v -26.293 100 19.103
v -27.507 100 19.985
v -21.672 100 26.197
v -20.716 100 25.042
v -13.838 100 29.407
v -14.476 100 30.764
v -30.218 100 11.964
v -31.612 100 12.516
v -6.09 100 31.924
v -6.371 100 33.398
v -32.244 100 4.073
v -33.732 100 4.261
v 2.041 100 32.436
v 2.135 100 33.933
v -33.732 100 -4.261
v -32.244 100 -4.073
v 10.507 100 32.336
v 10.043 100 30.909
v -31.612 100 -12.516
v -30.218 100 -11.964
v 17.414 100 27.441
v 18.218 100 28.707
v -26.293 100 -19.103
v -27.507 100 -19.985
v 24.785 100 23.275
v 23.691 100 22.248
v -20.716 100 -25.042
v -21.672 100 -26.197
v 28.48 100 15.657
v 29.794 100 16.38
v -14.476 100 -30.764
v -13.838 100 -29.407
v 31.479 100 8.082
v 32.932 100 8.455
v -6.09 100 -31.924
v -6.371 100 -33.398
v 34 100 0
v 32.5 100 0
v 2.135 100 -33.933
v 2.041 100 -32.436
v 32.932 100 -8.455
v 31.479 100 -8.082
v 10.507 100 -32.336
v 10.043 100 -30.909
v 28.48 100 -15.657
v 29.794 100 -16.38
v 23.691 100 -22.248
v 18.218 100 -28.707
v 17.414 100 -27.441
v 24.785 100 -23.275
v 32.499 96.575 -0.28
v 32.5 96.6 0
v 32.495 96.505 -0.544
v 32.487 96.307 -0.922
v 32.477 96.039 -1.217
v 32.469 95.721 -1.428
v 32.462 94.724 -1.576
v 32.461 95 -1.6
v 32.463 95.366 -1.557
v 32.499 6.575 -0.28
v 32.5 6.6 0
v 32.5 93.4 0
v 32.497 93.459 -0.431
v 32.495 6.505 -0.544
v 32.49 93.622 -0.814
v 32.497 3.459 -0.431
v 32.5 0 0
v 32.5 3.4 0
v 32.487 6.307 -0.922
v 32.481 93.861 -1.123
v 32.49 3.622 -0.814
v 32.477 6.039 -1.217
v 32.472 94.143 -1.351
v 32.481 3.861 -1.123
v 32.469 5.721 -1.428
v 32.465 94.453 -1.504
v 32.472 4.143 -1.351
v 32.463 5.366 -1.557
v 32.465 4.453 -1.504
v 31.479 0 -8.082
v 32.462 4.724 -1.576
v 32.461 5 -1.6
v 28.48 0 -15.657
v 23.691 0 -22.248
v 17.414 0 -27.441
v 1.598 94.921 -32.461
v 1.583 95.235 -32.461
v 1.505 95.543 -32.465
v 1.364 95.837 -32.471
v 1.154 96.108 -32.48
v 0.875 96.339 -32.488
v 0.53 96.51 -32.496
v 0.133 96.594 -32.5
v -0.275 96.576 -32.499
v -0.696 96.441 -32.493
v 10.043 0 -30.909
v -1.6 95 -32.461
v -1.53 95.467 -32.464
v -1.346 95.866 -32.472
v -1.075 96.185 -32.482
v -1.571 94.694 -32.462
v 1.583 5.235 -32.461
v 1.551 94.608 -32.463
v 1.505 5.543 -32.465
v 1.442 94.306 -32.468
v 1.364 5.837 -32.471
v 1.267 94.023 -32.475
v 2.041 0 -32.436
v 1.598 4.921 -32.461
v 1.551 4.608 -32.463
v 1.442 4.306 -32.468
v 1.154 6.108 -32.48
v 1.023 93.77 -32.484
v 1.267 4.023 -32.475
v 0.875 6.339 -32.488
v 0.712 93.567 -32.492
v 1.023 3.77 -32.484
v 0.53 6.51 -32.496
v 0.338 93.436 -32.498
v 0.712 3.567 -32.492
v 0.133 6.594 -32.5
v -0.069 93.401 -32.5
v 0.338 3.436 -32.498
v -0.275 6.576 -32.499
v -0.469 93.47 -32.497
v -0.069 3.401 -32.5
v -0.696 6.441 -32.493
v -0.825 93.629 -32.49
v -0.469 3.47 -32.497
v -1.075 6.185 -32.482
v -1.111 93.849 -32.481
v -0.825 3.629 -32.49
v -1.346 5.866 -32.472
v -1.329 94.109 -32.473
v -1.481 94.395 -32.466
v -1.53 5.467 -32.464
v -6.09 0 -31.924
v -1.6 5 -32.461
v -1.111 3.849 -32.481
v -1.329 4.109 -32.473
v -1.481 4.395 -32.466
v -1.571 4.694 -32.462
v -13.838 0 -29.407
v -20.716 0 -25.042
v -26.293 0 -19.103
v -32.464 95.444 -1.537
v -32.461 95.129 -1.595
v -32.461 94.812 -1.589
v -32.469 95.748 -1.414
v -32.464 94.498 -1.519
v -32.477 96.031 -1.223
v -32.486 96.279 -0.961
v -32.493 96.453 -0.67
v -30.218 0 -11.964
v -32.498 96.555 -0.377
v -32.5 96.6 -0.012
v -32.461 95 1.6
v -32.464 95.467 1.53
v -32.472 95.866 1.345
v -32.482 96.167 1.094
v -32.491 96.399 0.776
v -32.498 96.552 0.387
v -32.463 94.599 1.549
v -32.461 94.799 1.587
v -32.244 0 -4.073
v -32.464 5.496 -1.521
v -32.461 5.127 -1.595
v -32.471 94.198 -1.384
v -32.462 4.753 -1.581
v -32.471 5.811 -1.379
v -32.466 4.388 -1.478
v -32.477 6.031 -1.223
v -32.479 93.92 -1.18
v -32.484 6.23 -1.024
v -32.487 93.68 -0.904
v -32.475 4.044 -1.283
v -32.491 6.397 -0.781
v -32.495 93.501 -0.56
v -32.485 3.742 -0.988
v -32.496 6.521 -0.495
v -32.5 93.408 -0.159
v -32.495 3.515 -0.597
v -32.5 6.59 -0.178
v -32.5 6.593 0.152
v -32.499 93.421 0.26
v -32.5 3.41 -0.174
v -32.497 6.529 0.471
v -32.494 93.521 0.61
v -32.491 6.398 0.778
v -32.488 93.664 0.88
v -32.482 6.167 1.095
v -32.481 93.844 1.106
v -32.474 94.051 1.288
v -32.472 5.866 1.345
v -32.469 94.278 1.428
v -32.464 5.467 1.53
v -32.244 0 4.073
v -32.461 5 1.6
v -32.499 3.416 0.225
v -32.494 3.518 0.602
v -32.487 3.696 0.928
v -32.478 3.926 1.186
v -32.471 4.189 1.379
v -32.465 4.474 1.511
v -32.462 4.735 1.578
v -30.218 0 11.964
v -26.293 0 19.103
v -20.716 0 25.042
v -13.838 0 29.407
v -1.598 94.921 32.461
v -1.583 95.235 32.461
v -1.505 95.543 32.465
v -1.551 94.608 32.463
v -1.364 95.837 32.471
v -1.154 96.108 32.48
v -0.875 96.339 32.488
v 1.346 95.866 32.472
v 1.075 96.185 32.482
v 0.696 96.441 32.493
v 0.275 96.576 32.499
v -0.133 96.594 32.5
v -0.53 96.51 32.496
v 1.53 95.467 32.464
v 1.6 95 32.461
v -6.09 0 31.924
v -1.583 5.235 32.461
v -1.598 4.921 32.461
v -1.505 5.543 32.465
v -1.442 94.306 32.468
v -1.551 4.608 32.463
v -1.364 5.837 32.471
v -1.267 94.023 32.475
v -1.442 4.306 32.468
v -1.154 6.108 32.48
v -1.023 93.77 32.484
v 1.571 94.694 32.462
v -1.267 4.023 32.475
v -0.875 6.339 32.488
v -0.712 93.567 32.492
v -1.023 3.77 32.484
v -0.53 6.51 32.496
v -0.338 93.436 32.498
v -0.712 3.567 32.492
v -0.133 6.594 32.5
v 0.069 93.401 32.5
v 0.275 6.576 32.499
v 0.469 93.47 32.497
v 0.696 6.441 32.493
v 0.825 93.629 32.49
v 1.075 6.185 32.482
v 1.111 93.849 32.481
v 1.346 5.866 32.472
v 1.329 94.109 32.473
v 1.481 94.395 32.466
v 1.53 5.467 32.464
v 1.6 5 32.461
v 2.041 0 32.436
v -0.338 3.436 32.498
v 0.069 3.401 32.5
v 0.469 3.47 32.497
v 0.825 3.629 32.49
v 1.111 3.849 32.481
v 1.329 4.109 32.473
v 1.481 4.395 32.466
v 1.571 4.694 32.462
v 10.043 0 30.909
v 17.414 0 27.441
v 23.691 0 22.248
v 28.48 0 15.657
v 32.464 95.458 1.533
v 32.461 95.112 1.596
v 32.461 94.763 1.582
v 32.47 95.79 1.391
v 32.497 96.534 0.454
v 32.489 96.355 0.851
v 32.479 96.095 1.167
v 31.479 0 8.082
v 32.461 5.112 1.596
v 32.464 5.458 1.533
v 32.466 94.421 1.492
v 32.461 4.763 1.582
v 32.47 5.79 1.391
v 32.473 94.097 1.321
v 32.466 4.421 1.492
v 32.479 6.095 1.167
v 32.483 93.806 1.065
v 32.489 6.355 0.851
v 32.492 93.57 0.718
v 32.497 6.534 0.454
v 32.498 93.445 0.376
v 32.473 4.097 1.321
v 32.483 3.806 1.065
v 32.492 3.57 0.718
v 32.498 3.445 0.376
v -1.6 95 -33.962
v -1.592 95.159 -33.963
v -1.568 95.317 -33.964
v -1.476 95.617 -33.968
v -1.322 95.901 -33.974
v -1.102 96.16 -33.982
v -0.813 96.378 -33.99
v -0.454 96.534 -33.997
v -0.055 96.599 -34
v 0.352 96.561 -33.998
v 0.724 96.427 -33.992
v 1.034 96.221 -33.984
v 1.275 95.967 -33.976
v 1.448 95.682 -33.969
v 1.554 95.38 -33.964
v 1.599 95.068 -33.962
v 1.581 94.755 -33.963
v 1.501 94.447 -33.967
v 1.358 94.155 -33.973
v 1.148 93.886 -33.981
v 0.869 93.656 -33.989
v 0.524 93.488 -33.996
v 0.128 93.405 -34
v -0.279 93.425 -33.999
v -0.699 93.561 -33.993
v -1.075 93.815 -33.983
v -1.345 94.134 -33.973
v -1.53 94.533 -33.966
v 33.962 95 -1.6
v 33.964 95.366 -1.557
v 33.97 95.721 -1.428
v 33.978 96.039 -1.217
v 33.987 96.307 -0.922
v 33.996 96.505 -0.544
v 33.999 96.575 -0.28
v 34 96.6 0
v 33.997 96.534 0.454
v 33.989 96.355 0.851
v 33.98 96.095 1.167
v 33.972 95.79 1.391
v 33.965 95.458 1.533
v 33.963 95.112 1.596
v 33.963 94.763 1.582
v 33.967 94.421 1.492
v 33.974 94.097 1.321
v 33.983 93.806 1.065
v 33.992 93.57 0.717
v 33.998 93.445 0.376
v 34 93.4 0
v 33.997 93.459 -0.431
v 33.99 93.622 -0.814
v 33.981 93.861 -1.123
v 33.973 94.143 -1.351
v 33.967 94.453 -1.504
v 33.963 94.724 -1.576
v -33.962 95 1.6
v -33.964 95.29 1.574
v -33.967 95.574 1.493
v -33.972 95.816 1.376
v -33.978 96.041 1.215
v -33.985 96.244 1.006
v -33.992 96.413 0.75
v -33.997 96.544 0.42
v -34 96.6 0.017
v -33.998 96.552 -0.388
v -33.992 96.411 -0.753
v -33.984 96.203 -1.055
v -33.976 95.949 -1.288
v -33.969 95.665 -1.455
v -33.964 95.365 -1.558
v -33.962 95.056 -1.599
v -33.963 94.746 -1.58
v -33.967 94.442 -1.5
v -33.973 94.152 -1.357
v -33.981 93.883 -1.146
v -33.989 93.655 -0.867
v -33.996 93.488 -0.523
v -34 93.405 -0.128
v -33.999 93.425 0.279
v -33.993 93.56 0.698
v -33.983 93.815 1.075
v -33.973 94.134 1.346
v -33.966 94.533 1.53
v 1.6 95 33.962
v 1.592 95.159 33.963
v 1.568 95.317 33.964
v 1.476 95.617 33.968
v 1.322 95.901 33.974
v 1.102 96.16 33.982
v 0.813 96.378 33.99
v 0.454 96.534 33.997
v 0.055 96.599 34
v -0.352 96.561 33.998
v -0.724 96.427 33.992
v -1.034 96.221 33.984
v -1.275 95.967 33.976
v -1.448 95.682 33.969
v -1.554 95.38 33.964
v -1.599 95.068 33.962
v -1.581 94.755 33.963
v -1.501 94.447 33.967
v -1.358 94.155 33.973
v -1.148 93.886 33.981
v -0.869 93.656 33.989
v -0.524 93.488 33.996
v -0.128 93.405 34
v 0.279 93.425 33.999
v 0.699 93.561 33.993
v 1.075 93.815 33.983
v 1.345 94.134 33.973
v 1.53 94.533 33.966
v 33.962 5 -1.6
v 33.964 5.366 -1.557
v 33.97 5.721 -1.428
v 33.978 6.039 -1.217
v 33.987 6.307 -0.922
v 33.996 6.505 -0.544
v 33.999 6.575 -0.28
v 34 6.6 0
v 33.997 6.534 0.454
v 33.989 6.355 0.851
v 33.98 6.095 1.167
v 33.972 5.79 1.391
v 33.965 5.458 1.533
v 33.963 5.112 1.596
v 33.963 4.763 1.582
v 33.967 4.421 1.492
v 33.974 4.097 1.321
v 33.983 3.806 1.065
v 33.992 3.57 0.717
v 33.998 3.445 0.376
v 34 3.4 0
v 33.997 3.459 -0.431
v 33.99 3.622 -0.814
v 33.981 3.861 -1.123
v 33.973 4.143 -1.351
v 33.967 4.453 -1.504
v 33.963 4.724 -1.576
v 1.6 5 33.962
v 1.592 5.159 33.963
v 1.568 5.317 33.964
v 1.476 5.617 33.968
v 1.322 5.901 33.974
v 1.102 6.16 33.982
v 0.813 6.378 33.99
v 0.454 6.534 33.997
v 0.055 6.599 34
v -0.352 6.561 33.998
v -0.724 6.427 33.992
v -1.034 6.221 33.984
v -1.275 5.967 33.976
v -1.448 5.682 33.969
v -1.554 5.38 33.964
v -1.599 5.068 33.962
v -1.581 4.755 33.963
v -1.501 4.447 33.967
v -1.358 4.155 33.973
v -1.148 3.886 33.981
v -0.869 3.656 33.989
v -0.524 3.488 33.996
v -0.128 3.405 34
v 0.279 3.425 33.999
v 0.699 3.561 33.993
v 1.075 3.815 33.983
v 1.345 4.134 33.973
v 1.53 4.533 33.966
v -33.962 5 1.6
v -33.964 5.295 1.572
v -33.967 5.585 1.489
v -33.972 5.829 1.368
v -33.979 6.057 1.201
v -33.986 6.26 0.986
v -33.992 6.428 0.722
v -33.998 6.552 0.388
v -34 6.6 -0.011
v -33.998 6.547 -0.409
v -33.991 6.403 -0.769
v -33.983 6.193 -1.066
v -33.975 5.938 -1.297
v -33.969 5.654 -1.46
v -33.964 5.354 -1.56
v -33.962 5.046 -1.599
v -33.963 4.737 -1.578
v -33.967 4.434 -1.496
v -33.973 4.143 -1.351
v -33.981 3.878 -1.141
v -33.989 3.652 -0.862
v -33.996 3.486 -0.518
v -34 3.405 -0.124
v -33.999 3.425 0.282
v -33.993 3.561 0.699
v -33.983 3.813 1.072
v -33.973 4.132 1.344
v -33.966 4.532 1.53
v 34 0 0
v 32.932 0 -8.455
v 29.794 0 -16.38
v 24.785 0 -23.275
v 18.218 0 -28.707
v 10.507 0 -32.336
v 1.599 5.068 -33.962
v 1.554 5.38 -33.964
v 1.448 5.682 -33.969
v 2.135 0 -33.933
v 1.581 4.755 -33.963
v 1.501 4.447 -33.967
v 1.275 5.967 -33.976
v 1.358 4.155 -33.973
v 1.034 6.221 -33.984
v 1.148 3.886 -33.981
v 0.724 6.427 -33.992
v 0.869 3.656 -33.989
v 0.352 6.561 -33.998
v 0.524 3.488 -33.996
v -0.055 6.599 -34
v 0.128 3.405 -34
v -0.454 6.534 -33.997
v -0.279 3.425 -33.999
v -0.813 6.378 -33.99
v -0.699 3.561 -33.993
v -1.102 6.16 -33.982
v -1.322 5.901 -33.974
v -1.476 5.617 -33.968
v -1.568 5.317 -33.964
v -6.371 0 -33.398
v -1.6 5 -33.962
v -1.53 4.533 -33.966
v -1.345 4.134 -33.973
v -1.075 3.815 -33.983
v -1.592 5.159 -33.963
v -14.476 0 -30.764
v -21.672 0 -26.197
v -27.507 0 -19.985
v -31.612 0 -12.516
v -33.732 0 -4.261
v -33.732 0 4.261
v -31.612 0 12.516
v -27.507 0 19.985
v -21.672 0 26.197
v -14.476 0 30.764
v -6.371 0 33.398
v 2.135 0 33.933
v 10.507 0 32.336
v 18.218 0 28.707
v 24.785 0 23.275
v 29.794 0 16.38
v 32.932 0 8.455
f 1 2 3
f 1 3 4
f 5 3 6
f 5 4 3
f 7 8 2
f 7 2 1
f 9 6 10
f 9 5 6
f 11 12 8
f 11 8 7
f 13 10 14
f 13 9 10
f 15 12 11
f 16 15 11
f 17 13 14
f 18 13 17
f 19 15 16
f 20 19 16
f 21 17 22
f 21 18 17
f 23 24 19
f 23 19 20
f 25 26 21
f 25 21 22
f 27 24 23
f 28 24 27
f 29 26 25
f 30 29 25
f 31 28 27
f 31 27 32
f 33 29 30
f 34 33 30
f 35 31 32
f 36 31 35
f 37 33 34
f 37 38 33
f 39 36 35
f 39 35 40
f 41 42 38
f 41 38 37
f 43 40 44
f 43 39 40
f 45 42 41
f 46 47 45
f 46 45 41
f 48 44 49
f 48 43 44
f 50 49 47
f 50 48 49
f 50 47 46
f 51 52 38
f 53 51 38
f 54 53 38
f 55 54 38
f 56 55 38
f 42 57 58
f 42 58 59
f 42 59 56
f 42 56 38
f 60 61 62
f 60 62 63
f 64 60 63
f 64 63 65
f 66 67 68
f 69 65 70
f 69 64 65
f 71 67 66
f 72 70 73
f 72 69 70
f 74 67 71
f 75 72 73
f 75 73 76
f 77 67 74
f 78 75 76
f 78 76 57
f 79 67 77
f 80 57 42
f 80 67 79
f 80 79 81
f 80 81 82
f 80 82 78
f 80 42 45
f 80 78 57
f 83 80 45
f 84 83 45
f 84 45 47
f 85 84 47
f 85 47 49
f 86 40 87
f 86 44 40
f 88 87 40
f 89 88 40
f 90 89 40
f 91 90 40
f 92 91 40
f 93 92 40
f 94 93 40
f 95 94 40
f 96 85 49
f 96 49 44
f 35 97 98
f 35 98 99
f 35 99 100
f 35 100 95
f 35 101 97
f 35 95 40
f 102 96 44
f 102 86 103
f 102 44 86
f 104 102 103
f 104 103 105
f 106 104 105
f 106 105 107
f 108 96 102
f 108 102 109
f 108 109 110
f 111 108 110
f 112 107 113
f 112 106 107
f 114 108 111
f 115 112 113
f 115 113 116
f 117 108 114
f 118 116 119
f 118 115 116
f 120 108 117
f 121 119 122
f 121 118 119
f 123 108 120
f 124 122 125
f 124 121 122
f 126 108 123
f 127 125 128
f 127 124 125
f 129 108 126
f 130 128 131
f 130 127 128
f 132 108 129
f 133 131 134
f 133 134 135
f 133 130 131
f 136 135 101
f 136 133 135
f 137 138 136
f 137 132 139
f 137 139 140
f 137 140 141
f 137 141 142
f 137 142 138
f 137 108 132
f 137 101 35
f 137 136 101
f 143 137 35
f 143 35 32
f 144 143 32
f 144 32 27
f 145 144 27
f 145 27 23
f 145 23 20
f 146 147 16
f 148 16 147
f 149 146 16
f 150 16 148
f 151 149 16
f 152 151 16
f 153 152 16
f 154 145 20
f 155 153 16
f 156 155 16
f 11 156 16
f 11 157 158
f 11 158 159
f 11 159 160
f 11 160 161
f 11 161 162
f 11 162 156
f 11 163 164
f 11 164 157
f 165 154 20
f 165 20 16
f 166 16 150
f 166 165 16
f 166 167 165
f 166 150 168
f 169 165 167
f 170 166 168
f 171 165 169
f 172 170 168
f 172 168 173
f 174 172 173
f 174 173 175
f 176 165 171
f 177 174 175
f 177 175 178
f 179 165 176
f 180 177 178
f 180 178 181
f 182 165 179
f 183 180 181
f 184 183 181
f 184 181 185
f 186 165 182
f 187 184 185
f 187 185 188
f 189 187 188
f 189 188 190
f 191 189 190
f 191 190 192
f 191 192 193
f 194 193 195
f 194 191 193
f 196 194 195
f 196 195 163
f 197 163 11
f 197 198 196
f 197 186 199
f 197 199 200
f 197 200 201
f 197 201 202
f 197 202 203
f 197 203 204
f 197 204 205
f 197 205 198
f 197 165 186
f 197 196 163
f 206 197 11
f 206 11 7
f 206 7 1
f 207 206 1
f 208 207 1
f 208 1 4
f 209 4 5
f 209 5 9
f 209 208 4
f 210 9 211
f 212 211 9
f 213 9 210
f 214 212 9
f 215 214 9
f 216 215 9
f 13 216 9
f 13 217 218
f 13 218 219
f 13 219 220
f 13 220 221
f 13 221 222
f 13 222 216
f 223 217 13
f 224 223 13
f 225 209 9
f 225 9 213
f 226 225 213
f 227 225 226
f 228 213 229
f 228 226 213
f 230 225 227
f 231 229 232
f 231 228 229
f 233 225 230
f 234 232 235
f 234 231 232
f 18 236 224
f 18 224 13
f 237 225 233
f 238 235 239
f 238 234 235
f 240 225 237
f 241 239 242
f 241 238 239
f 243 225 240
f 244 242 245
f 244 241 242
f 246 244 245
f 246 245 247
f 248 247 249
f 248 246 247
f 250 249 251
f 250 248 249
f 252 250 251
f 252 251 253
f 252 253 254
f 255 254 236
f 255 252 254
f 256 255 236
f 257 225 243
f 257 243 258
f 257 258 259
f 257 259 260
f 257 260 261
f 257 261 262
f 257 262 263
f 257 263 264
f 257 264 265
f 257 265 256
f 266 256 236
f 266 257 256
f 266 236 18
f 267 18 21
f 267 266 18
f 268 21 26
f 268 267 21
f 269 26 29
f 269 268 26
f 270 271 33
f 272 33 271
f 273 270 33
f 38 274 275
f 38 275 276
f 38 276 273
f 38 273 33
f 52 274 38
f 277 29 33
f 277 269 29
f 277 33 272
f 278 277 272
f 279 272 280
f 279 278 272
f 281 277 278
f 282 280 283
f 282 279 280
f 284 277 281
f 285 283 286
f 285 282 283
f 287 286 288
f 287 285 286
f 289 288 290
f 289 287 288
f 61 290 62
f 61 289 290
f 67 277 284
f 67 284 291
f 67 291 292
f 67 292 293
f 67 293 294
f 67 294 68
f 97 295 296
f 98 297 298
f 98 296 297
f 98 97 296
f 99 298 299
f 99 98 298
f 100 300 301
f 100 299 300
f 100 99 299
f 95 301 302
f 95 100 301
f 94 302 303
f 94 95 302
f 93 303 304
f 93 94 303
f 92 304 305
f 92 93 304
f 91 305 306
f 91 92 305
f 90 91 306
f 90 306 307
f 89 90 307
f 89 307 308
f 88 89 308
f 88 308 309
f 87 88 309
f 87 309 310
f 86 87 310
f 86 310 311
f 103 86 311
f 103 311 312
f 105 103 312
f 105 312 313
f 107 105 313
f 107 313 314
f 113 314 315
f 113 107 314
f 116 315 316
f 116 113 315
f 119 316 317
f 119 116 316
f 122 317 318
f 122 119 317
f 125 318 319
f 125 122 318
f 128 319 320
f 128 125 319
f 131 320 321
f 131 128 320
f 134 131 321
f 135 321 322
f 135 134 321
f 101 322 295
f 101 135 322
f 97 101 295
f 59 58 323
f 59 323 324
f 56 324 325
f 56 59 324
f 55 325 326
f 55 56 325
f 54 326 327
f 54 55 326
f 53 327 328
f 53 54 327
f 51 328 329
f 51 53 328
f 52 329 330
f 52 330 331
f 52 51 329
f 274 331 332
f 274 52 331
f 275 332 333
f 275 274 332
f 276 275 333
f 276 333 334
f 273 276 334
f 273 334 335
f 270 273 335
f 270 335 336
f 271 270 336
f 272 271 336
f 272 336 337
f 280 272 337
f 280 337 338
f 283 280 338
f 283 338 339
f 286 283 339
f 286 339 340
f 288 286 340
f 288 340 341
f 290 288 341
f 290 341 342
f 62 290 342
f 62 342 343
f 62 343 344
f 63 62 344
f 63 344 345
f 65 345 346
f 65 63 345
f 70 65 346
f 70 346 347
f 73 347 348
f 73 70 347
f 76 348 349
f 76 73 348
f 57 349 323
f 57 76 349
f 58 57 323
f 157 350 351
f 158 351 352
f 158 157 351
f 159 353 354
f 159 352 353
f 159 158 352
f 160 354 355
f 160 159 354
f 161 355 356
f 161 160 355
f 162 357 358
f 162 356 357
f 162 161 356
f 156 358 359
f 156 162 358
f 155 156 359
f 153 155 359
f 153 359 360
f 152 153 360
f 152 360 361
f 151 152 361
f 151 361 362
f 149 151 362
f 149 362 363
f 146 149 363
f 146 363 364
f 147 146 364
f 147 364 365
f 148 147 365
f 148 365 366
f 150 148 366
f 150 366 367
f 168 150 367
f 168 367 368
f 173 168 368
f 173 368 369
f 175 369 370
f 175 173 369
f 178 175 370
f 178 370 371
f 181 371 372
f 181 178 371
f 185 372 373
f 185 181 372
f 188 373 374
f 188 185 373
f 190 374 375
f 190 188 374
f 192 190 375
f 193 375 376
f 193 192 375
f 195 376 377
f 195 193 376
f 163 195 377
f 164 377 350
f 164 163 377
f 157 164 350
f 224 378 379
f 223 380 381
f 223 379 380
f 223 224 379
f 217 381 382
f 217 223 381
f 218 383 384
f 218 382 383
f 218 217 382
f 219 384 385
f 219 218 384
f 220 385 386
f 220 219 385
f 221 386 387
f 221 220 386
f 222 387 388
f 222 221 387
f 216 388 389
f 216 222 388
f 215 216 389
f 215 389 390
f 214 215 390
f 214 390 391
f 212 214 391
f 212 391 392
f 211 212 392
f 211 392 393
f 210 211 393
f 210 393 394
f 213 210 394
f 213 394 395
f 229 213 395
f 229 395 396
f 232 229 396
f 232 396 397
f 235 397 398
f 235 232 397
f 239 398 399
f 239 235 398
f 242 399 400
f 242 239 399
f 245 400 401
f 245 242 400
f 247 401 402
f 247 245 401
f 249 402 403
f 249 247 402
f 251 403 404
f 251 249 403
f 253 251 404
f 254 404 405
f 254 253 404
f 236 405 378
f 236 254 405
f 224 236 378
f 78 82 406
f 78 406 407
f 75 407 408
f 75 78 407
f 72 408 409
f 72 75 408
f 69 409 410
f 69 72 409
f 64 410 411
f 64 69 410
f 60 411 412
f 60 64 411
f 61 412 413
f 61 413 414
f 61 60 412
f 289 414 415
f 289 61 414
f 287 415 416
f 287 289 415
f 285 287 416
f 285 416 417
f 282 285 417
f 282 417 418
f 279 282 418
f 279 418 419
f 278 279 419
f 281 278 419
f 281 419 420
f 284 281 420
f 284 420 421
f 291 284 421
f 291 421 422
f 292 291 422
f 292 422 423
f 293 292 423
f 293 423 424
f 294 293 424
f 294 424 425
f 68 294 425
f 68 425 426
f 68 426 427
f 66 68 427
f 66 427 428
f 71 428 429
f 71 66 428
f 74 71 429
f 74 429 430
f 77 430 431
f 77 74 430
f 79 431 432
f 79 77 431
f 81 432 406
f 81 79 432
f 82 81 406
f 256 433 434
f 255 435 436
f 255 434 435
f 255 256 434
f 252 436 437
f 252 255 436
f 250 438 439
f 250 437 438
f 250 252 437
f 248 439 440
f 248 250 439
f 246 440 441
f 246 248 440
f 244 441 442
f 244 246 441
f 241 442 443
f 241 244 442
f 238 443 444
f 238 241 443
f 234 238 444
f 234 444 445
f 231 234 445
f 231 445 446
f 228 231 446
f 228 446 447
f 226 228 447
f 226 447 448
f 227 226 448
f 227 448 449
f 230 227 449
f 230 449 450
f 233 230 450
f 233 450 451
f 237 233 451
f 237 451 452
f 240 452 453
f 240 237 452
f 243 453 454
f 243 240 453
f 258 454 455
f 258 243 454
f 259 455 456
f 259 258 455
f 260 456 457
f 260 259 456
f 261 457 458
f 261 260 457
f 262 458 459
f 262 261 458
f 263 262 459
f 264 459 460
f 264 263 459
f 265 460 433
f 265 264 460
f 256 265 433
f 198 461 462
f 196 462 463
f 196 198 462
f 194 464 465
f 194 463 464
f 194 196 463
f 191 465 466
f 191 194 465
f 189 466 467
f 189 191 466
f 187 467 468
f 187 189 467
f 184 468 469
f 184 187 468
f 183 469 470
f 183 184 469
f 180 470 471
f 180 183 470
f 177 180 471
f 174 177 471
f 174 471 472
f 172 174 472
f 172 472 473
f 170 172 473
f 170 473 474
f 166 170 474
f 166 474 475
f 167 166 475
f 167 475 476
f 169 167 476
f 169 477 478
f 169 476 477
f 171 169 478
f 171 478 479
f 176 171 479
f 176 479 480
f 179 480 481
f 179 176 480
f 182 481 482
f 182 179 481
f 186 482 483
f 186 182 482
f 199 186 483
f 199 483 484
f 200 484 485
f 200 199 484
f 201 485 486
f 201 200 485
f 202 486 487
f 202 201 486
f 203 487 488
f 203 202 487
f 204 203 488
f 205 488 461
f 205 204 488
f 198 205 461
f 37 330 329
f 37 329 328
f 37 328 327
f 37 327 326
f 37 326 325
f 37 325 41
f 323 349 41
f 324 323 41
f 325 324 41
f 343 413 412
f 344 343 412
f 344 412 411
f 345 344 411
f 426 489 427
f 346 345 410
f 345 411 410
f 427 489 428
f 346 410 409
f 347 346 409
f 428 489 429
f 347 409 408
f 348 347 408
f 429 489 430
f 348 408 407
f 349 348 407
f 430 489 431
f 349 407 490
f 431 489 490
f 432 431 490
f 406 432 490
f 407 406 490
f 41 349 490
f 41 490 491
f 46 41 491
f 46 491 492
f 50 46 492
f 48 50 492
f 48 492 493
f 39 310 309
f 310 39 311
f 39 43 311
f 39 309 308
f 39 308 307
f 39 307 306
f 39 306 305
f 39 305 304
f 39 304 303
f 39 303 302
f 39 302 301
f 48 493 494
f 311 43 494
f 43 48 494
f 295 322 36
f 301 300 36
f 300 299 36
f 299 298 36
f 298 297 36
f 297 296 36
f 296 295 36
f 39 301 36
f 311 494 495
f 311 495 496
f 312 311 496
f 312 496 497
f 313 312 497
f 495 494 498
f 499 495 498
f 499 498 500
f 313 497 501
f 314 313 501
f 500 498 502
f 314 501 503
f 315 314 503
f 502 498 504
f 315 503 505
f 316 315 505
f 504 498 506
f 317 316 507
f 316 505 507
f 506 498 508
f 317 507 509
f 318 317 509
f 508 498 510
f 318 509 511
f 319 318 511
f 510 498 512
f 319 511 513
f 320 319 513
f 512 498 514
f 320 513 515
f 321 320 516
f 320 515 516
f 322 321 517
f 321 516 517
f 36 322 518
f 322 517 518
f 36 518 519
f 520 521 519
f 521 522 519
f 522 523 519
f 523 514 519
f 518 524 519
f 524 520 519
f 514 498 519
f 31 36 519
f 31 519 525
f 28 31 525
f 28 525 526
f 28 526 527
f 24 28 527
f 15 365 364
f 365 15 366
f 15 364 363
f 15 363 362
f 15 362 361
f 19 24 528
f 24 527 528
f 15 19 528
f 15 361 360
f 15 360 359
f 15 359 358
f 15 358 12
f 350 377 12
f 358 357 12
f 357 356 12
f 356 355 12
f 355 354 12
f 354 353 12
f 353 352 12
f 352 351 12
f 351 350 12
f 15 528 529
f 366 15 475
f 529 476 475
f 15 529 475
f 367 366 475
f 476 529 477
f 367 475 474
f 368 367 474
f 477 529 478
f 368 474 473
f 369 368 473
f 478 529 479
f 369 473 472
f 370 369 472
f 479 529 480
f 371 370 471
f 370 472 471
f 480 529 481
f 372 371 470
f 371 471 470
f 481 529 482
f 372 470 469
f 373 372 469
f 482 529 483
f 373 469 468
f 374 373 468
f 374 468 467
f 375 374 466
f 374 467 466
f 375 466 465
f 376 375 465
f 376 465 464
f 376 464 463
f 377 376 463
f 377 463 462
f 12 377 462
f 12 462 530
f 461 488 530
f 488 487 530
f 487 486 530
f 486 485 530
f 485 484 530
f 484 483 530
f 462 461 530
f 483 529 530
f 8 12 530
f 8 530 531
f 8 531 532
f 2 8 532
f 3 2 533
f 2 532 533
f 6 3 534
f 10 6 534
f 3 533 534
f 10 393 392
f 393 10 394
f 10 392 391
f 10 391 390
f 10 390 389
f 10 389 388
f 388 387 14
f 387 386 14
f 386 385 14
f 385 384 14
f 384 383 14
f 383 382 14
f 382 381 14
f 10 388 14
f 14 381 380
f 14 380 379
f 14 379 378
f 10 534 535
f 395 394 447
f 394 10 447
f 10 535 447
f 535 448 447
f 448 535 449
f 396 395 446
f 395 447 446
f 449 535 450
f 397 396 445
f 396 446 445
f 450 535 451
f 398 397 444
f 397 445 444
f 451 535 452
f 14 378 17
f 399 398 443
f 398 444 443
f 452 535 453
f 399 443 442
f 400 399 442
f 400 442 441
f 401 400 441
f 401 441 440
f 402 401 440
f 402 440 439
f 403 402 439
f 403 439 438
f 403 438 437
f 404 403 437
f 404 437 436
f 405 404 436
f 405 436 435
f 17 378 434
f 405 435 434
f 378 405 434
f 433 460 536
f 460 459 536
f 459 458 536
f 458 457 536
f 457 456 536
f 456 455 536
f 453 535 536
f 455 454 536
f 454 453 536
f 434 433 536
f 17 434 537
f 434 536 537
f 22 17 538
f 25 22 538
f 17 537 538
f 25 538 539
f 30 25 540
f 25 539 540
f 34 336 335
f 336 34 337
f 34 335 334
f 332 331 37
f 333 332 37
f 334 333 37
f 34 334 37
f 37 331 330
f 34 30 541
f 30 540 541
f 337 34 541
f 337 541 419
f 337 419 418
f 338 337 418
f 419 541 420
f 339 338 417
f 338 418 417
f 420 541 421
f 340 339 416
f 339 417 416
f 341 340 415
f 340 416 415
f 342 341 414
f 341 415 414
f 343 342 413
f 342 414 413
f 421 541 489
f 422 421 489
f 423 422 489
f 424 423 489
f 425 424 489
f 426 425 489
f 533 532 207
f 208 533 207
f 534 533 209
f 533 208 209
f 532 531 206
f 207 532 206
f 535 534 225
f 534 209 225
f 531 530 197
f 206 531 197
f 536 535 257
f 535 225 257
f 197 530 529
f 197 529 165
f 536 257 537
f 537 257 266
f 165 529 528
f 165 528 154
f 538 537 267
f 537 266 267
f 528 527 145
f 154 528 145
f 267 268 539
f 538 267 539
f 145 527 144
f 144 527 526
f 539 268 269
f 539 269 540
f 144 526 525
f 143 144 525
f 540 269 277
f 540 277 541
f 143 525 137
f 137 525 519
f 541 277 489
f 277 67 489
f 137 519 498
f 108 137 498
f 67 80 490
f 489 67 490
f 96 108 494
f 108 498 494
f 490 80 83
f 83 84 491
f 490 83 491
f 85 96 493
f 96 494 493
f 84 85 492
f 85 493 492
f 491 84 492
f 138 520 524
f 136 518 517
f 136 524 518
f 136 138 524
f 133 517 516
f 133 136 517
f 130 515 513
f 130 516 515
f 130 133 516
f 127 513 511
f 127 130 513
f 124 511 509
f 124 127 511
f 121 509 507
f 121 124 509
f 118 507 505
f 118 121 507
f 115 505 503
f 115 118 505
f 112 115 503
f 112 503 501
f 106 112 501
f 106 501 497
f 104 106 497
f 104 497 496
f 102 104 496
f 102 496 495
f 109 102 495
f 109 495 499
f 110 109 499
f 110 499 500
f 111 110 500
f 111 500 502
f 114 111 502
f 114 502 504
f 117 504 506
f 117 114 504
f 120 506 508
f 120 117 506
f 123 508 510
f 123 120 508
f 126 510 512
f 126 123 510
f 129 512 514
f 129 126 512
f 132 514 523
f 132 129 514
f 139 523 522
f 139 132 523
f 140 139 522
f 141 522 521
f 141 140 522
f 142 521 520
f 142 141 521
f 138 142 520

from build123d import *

# Parameters (mm, degrees)
SKETCH_1_R               = 34
SKETCH_1_R_2             = 32.5
EXTRUDE_1_DEPTH          = 100
CUT_EXTRUDE_START        = -1.539409
SKETCH_3_R               = 1.6
CUT_EXTRUDE_4_DEPTH      = 1.539409
PATTERN_CIRCULAR_1_COUNT = 4
SKETCH_5_R               = 1.6
CUT_EXTRUDE_5_DEPTH      = 1.539409
PATTERN_CIRCULAR_2_COUNT = 4


with BuildPart() as part:
    # 草图1 → 凸台-拉伸1 (new body)
    with BuildSketch(Plane(origin=(0, 0, 0), x_dir=(1, 0, 0), z_dir=(0, 1, 0))):
        Circle(SKETCH_1_R)
        Circle(SKETCH_1_R_2, mode=Mode.SUBTRACT)
    extrude(amount=EXTRUDE_1_DEPTH)

    # 草图3 → 切除-拉伸4 (cut)
    with BuildSketch(Plane.XY.offset(34).offset(CUT_EXTRUDE_START)):
        with Locations((0, 5)):
            Circle(SKETCH_3_R)
    cut_extrude_4 = extrude(amount=CUT_EXTRUDE_4_DEPTH, mode=Mode.SUBTRACT)

    # 阵列(圆周)1: 切除-拉伸4 ×4 about axis
    pattern_circular_1_axis = Axis((0, 100, 0), (0, -1, 0))
    for i in range(1, PATTERN_CIRCULAR_1_COUNT):
        add(cut_extrude_4.rotate(pattern_circular_1_axis, i * 360 / PATTERN_CIRCULAR_1_COUNT), mode=Mode.SUBTRACT)

    # 草图5 → 切除-拉伸5 (cut)
    with BuildSketch(Plane.XY.offset(34).offset(CUT_EXTRUDE_START)):
        with Locations((0, 95)):
            Circle(SKETCH_5_R)
    cut_extrude_5 = extrude(amount=CUT_EXTRUDE_5_DEPTH, mode=Mode.SUBTRACT)

    # 阵列(圆周)2: 切除-拉伸5 ×4 about axis
    pattern_circular_2_axis = Axis((0, 100, 0), (0, -1, 0))
    for i in range(1, PATTERN_CIRCULAR_2_COUNT):
        add(cut_extrude_5.rotate(pattern_circular_2_axis, i * 360 / PATTERN_CIRCULAR_2_COUNT), mode=Mode.SUBTRACT)


solid = part.part
